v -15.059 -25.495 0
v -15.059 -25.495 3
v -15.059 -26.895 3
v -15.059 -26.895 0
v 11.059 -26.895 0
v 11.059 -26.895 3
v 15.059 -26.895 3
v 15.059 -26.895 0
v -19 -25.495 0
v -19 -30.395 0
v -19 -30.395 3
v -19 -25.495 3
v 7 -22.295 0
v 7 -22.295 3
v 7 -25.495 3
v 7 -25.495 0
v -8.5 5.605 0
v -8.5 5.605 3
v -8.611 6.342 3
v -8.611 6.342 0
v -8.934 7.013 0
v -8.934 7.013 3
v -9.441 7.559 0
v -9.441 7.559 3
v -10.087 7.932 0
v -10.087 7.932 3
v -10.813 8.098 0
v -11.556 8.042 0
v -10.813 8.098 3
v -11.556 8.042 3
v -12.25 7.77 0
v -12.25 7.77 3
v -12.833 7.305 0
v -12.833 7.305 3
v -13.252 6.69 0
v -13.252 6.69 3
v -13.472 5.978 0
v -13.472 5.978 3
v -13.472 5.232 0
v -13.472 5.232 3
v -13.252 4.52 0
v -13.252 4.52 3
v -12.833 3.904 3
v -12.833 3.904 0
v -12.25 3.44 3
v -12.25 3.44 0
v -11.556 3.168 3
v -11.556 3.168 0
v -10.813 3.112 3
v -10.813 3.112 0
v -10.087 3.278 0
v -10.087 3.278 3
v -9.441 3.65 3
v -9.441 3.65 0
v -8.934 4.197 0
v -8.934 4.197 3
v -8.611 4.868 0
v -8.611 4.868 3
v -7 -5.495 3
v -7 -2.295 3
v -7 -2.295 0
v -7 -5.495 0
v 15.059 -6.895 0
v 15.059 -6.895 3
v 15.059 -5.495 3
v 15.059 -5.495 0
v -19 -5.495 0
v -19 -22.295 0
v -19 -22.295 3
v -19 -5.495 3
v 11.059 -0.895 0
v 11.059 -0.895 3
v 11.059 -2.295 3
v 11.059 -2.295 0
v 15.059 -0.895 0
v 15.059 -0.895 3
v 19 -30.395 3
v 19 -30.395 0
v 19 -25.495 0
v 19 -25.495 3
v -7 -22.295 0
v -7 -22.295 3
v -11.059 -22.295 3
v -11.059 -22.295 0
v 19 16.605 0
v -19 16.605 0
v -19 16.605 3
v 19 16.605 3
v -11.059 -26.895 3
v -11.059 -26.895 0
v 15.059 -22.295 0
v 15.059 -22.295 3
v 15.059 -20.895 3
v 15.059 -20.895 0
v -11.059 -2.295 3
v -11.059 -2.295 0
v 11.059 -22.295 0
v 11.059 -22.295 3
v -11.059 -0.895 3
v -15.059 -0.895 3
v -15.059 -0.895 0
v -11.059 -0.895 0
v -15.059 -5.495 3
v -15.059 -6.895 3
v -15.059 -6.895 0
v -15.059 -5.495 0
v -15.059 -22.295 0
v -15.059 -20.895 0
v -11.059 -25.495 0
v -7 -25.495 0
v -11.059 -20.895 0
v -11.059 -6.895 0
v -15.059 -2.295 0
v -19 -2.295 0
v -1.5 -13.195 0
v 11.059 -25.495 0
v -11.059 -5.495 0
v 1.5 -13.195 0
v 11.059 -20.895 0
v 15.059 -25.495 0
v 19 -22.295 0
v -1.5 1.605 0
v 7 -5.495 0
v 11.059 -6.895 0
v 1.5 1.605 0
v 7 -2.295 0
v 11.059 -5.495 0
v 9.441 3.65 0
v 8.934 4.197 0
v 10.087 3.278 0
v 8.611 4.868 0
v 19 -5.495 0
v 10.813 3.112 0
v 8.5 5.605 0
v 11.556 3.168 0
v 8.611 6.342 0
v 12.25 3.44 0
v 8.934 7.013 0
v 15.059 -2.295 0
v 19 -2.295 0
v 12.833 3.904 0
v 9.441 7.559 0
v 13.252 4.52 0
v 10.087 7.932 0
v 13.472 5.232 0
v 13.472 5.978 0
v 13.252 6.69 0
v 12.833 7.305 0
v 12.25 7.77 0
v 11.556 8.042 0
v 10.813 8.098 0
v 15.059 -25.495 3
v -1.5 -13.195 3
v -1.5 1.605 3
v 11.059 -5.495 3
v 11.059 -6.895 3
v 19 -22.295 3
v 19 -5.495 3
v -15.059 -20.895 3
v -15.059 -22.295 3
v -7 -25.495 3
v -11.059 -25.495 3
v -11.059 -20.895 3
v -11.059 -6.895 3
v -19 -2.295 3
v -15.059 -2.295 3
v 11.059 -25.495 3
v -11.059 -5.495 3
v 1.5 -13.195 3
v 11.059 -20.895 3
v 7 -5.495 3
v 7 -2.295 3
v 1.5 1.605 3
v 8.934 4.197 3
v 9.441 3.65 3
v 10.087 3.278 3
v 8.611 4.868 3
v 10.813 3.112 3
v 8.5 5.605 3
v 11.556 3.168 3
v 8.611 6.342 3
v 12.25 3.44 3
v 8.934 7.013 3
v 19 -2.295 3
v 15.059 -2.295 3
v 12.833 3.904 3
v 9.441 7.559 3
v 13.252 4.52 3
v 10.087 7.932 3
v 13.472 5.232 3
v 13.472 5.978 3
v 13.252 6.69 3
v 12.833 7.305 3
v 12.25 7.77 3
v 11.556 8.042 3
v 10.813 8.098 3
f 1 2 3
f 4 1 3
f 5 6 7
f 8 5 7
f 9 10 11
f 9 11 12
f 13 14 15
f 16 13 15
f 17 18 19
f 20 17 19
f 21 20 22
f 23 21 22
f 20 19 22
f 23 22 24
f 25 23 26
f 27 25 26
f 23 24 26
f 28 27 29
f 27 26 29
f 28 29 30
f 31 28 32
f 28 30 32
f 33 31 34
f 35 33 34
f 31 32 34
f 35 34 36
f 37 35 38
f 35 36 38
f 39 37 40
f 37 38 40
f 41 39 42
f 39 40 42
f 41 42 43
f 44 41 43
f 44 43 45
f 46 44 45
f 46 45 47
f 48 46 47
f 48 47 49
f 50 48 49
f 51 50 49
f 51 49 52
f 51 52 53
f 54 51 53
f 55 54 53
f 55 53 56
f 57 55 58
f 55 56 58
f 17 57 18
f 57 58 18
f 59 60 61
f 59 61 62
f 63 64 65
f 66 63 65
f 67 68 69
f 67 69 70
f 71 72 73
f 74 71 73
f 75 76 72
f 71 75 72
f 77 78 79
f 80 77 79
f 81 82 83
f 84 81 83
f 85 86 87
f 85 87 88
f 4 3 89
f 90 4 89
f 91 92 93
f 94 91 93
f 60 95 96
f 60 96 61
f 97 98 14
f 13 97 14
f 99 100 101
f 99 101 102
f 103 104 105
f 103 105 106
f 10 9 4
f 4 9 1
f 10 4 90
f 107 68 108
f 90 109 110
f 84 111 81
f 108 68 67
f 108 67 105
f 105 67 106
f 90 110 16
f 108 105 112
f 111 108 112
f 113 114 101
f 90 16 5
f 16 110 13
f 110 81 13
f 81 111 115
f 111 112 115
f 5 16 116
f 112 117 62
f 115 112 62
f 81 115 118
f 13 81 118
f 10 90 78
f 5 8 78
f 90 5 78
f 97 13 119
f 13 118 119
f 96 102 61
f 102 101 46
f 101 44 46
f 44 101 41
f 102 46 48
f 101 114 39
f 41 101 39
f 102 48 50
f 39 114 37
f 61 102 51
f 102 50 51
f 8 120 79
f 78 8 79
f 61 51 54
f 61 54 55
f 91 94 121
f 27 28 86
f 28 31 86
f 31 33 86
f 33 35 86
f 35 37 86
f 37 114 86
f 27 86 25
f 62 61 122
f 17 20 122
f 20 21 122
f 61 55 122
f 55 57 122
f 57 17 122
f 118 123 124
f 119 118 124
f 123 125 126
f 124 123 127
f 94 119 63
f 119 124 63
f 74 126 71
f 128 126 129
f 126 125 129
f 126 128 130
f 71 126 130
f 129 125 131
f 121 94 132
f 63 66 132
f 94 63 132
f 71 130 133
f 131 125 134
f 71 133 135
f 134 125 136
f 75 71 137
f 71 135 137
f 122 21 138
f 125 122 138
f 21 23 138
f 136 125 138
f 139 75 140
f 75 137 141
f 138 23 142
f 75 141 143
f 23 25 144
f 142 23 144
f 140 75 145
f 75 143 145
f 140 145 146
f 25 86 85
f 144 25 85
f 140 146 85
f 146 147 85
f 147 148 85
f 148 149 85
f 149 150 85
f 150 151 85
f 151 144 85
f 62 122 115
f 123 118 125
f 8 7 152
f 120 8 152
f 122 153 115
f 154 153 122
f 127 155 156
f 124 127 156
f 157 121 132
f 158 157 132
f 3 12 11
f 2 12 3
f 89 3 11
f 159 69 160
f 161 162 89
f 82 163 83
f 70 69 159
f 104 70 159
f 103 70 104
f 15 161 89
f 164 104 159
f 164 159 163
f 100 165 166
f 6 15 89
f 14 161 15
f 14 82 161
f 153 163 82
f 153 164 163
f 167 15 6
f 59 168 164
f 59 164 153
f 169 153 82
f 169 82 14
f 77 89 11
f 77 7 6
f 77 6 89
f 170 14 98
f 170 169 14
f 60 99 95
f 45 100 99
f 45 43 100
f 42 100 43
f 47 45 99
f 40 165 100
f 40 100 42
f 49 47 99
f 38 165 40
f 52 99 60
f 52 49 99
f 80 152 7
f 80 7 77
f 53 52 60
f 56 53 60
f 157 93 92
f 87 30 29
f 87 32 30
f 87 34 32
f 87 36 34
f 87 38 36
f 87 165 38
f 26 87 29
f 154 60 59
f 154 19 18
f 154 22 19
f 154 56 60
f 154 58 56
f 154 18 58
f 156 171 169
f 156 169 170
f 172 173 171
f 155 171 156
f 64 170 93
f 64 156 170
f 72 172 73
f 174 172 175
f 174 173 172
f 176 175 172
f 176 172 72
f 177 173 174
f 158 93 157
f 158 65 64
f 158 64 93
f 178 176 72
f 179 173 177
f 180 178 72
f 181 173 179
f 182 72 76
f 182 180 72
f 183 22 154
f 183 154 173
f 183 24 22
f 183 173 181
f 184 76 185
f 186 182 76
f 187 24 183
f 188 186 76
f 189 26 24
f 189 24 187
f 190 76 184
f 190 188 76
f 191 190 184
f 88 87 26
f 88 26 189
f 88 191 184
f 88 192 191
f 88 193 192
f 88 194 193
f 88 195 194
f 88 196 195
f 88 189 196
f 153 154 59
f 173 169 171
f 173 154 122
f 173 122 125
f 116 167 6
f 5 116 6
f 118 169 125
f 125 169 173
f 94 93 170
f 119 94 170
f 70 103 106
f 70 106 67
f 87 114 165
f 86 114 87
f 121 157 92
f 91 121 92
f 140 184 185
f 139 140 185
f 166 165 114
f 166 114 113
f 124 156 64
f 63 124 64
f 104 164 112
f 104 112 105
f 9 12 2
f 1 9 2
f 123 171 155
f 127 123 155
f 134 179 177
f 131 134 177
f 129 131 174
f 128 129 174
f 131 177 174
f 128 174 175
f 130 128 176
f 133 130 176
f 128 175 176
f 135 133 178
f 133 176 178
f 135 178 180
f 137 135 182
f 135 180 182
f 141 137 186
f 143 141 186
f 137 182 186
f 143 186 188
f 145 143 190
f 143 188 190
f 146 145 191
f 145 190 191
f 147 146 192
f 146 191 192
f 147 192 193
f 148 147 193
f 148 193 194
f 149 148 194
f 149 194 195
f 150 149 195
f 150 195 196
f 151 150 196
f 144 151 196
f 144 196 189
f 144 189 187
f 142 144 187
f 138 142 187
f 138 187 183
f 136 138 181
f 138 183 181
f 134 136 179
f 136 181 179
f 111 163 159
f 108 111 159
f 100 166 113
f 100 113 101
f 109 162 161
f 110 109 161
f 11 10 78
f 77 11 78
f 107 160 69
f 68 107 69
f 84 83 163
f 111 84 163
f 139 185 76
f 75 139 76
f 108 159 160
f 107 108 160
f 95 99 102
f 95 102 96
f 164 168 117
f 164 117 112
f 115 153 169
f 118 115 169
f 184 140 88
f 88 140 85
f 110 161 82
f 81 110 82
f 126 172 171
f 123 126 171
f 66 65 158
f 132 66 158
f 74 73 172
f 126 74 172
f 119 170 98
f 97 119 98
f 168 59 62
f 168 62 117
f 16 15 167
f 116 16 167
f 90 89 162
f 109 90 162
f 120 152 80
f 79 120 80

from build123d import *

# Parameters (mm, degrees)
SKETCH1_W           = 38
SKETCH1_H           = 47
BOSS_EXTRUDE1_DEPTH = 3
SKETCH2_R           = 2.5
CUT_EXTRUDE1_DEPTH  = 3
CUT_EXTRUDE2_DEPTH  = 3
SKETCH4_W           = 3
SKETCH4_H           = 14.8
CUT_EXTRUDE3_DEPTH  = 10


with BuildPart() as part:
    # Sketch1 → Boss-Extrude1 (new body)
    with BuildSketch(Plane.XY):
        with Locations((0, -6.895095368)):
            Rectangle(SKETCH1_W, SKETCH1_H)
    extrude(amount=BOSS_EXTRUDE1_DEPTH)

    # Sketch2 → Cut-Extrude1 (cut)
    with BuildSketch(Plane.XY.offset(3)):
        with Locations((-11, 5.604904632)):
            Circle(SKETCH2_R)
        with Locations(Location((11, 5.604904632, 0), (0, 0, 180))):
            Circle(SKETCH2_R)
    extrude(amount=-CUT_EXTRUDE1_DEPTH, mode=Mode.SUBTRACT)

    # Sketch3 → Cut-Extrude2 (cut)
    with BuildSketch(Plane.XY.offset(3)):
        Polygon((-7, -5.495095368), (-11.059072882, -5.495095368), (-11.059072882, -6.895095368), (-15.059072882, -6.895095368), (-15.059072882, -5.495095368), (-19, -5.495095368), (-19, -2.295095368), (-15.059072882, -2.295095368), (-15.059072882, -0.895095368), (-11.059072882, -0.895095368), (-11.059072882, -2.295095368), (-7, -2.295095368), align=None)
        Polygon((7, -5.495095368), (11.059072882, -5.495095368), (11.059072882, -6.895095368), (15.059072882, -6.895095368), (15.059072882, -5.495095368), (19, -5.495095368), (19, -2.295095368), (15.059072882, -2.295095368), (15.059072882, -0.895095368), (11.059072882, -0.895095368), (11.059072882, -2.295095368), (7, -2.295095368), align=None)
        Polygon((-7, -25.495095368), (-7, -22.295095368), (-11.059072882, -22.295095368), (-11.059072882, -20.895095368), (-15.059072882, -20.895095368), (-15.059072882, -22.295095368), (-19, -22.295095368), (-19, -25.495095368), (-15.059072882, -25.495095368), (-15.059072882, -26.895095368), (-11.059072882, -26.895095368), (-11.059072882, -25.495095368), align=None)
        Polygon((7, -25.495095368), (11.059072882, -25.495095368), (11.059072882, -26.895095368), (15.059072882, -26.895095368), (15.059072882, -25.495095368), (19, -25.495095368), (19, -22.295095368), (15.059072882, -22.295095368), (15.059072882, -20.895095368), (11.059072882, -20.895095368), (11.059072882, -22.295095368), (7, -22.295095368), align=None)
    extrude(amount=-CUT_EXTRUDE2_DEPTH, mode=Mode.SUBTRACT)

    # Sketch4 → Cut-Extrude3 (cut)
    with BuildSketch(Plane.XY.offset(3)):
        with Locations((0, -5.795095368)):
            Rectangle(SKETCH4_W, SKETCH4_H)
    extrude(amount=-CUT_EXTRUDE3_DEPTH, mode=Mode.SUBTRACT)


solid = part.part
